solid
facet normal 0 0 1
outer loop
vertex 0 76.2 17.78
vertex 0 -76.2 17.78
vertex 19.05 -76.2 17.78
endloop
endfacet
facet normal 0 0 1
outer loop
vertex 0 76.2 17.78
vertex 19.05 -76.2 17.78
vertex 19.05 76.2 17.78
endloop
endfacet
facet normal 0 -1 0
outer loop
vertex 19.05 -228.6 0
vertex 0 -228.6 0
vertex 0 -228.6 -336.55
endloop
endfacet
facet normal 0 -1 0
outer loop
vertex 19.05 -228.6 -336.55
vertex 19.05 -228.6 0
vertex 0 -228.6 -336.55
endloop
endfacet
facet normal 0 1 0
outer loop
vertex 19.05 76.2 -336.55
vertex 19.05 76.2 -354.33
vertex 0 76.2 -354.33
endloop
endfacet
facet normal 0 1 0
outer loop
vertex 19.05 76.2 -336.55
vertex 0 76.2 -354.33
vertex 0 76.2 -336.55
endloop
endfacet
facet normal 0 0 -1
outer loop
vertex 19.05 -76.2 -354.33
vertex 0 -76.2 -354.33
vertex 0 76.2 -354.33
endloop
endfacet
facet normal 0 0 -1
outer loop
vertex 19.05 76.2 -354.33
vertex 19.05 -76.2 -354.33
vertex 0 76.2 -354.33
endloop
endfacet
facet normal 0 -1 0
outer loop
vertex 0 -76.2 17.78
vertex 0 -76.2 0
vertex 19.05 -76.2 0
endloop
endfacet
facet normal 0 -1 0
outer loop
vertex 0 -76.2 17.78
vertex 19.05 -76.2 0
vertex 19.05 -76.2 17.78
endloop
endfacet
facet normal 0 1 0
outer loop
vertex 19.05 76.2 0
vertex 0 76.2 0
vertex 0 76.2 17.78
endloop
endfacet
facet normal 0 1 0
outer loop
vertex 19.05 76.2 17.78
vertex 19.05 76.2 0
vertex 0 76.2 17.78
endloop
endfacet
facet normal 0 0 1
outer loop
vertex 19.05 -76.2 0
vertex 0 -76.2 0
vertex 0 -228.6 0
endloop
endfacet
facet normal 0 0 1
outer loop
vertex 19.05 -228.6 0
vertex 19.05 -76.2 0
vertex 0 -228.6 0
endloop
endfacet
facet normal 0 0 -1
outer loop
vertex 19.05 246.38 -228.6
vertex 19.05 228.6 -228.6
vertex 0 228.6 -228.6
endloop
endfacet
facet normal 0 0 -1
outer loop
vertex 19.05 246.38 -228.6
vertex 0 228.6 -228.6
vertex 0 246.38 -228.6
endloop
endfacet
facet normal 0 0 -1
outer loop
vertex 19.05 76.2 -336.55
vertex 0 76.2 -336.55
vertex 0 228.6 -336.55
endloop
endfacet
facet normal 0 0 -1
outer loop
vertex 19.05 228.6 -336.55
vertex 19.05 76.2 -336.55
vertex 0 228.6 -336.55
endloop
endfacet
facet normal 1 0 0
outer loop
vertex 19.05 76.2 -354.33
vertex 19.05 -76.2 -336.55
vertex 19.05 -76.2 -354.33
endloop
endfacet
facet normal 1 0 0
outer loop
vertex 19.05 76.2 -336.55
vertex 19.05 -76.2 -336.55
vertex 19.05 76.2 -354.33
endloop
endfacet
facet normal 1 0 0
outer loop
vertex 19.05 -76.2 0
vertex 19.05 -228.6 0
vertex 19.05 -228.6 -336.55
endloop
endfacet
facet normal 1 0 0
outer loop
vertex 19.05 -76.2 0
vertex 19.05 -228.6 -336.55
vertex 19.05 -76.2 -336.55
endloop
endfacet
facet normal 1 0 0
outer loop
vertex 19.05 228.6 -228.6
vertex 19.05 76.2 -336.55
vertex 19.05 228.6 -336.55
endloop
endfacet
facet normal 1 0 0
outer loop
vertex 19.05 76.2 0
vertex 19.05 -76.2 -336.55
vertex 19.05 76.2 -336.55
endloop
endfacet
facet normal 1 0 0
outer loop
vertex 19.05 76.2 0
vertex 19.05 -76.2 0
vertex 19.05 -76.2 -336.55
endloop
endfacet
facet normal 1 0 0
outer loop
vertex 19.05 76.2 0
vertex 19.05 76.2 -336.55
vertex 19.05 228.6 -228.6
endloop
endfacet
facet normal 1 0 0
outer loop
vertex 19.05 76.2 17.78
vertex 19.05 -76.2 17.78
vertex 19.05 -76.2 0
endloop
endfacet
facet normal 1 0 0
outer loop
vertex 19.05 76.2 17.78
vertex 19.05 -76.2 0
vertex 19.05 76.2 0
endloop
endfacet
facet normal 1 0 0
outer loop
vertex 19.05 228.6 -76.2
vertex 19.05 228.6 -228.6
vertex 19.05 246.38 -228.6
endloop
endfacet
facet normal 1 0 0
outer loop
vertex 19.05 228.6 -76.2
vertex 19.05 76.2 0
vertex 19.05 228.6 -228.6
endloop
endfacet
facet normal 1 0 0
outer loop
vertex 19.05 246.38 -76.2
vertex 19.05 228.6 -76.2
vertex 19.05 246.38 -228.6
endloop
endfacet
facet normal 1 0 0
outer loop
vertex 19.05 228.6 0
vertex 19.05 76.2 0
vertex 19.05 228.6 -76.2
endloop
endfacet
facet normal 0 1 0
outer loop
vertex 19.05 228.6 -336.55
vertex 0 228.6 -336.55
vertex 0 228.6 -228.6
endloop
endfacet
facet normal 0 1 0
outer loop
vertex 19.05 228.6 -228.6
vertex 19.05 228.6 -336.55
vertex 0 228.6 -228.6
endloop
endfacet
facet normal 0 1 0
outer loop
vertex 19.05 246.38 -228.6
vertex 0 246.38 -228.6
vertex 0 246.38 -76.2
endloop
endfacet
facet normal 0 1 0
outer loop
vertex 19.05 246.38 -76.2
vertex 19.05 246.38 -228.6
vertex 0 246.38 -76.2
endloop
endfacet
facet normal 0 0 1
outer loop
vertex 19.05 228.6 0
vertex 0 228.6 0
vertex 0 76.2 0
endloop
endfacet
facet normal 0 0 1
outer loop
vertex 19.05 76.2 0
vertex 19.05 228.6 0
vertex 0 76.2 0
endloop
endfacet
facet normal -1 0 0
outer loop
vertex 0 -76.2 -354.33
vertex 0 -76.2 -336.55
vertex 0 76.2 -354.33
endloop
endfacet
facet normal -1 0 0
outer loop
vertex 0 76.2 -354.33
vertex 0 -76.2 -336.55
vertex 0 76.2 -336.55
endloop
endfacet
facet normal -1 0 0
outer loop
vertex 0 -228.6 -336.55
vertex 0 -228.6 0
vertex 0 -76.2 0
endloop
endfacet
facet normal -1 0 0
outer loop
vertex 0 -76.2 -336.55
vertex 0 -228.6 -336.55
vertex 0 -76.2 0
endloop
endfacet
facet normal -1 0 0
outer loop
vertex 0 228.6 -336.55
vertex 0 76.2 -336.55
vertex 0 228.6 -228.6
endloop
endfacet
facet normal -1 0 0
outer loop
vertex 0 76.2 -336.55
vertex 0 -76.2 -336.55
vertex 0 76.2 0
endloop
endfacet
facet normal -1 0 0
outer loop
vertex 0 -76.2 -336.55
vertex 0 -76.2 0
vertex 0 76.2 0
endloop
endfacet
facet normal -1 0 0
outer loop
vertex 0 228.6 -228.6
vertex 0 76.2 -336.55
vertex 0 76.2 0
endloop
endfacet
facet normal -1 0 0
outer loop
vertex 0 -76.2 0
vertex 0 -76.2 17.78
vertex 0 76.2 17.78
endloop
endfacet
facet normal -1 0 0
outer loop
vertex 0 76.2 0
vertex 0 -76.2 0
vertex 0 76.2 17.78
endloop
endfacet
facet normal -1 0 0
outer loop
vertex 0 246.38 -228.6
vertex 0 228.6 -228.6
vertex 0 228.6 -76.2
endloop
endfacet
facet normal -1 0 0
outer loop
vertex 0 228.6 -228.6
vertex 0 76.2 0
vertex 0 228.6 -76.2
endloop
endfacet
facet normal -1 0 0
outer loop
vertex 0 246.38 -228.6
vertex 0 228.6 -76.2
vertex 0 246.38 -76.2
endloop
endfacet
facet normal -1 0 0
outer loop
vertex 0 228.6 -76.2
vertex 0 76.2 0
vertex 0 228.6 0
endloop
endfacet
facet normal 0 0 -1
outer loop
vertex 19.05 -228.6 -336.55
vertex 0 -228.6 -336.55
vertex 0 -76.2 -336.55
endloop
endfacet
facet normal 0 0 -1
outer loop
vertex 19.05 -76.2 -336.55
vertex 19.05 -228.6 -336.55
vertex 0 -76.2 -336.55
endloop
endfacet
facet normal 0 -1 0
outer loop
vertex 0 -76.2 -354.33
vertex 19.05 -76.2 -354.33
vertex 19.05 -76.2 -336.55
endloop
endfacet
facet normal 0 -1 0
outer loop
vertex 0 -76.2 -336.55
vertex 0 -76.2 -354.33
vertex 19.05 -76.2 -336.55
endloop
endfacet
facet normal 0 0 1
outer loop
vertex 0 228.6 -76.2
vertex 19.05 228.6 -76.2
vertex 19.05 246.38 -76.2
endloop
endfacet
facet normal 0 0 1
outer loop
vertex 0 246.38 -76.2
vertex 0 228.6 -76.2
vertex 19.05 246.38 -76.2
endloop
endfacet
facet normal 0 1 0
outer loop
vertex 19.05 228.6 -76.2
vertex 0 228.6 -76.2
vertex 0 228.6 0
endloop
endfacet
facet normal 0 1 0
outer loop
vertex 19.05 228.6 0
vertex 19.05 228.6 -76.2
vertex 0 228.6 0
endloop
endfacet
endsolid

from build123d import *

# Parameters (mm, degrees)
F0_W     = 152.4
F0_H     = 17.78
F0_W_2   = 17.78
F0_H_2   = 152.4
F1_DEPTH = 19.05


# Not quite as in the source:
# - a feature names something its author has since deleted; it is built from what else it names


with BuildPart() as f1:
    # F0 (on Right) → F1 (new body)
    with BuildSketch(Plane.YZ):
        with Locations((0, 8.89)):
            Rectangle(F0_W, F0_H)
        Polygon((-76.2, 0), (-228.6, 0), (-228.6, -336.55), (-76.2, -336.55), (76.2, -336.55), (228.6, -336.55), (228.6, -228.6), (228.6, -76.2), (228.6, 0), (76.2, 0), align=None)
        with Locations((237.49, -152.4)):
            Rectangle(F0_W_2, F0_H_2)
        with Locations((0, -345.44)):
            Rectangle(F0_W, F0_H)
    extrude(amount=F1_DEPTH)


solid = f1.part
